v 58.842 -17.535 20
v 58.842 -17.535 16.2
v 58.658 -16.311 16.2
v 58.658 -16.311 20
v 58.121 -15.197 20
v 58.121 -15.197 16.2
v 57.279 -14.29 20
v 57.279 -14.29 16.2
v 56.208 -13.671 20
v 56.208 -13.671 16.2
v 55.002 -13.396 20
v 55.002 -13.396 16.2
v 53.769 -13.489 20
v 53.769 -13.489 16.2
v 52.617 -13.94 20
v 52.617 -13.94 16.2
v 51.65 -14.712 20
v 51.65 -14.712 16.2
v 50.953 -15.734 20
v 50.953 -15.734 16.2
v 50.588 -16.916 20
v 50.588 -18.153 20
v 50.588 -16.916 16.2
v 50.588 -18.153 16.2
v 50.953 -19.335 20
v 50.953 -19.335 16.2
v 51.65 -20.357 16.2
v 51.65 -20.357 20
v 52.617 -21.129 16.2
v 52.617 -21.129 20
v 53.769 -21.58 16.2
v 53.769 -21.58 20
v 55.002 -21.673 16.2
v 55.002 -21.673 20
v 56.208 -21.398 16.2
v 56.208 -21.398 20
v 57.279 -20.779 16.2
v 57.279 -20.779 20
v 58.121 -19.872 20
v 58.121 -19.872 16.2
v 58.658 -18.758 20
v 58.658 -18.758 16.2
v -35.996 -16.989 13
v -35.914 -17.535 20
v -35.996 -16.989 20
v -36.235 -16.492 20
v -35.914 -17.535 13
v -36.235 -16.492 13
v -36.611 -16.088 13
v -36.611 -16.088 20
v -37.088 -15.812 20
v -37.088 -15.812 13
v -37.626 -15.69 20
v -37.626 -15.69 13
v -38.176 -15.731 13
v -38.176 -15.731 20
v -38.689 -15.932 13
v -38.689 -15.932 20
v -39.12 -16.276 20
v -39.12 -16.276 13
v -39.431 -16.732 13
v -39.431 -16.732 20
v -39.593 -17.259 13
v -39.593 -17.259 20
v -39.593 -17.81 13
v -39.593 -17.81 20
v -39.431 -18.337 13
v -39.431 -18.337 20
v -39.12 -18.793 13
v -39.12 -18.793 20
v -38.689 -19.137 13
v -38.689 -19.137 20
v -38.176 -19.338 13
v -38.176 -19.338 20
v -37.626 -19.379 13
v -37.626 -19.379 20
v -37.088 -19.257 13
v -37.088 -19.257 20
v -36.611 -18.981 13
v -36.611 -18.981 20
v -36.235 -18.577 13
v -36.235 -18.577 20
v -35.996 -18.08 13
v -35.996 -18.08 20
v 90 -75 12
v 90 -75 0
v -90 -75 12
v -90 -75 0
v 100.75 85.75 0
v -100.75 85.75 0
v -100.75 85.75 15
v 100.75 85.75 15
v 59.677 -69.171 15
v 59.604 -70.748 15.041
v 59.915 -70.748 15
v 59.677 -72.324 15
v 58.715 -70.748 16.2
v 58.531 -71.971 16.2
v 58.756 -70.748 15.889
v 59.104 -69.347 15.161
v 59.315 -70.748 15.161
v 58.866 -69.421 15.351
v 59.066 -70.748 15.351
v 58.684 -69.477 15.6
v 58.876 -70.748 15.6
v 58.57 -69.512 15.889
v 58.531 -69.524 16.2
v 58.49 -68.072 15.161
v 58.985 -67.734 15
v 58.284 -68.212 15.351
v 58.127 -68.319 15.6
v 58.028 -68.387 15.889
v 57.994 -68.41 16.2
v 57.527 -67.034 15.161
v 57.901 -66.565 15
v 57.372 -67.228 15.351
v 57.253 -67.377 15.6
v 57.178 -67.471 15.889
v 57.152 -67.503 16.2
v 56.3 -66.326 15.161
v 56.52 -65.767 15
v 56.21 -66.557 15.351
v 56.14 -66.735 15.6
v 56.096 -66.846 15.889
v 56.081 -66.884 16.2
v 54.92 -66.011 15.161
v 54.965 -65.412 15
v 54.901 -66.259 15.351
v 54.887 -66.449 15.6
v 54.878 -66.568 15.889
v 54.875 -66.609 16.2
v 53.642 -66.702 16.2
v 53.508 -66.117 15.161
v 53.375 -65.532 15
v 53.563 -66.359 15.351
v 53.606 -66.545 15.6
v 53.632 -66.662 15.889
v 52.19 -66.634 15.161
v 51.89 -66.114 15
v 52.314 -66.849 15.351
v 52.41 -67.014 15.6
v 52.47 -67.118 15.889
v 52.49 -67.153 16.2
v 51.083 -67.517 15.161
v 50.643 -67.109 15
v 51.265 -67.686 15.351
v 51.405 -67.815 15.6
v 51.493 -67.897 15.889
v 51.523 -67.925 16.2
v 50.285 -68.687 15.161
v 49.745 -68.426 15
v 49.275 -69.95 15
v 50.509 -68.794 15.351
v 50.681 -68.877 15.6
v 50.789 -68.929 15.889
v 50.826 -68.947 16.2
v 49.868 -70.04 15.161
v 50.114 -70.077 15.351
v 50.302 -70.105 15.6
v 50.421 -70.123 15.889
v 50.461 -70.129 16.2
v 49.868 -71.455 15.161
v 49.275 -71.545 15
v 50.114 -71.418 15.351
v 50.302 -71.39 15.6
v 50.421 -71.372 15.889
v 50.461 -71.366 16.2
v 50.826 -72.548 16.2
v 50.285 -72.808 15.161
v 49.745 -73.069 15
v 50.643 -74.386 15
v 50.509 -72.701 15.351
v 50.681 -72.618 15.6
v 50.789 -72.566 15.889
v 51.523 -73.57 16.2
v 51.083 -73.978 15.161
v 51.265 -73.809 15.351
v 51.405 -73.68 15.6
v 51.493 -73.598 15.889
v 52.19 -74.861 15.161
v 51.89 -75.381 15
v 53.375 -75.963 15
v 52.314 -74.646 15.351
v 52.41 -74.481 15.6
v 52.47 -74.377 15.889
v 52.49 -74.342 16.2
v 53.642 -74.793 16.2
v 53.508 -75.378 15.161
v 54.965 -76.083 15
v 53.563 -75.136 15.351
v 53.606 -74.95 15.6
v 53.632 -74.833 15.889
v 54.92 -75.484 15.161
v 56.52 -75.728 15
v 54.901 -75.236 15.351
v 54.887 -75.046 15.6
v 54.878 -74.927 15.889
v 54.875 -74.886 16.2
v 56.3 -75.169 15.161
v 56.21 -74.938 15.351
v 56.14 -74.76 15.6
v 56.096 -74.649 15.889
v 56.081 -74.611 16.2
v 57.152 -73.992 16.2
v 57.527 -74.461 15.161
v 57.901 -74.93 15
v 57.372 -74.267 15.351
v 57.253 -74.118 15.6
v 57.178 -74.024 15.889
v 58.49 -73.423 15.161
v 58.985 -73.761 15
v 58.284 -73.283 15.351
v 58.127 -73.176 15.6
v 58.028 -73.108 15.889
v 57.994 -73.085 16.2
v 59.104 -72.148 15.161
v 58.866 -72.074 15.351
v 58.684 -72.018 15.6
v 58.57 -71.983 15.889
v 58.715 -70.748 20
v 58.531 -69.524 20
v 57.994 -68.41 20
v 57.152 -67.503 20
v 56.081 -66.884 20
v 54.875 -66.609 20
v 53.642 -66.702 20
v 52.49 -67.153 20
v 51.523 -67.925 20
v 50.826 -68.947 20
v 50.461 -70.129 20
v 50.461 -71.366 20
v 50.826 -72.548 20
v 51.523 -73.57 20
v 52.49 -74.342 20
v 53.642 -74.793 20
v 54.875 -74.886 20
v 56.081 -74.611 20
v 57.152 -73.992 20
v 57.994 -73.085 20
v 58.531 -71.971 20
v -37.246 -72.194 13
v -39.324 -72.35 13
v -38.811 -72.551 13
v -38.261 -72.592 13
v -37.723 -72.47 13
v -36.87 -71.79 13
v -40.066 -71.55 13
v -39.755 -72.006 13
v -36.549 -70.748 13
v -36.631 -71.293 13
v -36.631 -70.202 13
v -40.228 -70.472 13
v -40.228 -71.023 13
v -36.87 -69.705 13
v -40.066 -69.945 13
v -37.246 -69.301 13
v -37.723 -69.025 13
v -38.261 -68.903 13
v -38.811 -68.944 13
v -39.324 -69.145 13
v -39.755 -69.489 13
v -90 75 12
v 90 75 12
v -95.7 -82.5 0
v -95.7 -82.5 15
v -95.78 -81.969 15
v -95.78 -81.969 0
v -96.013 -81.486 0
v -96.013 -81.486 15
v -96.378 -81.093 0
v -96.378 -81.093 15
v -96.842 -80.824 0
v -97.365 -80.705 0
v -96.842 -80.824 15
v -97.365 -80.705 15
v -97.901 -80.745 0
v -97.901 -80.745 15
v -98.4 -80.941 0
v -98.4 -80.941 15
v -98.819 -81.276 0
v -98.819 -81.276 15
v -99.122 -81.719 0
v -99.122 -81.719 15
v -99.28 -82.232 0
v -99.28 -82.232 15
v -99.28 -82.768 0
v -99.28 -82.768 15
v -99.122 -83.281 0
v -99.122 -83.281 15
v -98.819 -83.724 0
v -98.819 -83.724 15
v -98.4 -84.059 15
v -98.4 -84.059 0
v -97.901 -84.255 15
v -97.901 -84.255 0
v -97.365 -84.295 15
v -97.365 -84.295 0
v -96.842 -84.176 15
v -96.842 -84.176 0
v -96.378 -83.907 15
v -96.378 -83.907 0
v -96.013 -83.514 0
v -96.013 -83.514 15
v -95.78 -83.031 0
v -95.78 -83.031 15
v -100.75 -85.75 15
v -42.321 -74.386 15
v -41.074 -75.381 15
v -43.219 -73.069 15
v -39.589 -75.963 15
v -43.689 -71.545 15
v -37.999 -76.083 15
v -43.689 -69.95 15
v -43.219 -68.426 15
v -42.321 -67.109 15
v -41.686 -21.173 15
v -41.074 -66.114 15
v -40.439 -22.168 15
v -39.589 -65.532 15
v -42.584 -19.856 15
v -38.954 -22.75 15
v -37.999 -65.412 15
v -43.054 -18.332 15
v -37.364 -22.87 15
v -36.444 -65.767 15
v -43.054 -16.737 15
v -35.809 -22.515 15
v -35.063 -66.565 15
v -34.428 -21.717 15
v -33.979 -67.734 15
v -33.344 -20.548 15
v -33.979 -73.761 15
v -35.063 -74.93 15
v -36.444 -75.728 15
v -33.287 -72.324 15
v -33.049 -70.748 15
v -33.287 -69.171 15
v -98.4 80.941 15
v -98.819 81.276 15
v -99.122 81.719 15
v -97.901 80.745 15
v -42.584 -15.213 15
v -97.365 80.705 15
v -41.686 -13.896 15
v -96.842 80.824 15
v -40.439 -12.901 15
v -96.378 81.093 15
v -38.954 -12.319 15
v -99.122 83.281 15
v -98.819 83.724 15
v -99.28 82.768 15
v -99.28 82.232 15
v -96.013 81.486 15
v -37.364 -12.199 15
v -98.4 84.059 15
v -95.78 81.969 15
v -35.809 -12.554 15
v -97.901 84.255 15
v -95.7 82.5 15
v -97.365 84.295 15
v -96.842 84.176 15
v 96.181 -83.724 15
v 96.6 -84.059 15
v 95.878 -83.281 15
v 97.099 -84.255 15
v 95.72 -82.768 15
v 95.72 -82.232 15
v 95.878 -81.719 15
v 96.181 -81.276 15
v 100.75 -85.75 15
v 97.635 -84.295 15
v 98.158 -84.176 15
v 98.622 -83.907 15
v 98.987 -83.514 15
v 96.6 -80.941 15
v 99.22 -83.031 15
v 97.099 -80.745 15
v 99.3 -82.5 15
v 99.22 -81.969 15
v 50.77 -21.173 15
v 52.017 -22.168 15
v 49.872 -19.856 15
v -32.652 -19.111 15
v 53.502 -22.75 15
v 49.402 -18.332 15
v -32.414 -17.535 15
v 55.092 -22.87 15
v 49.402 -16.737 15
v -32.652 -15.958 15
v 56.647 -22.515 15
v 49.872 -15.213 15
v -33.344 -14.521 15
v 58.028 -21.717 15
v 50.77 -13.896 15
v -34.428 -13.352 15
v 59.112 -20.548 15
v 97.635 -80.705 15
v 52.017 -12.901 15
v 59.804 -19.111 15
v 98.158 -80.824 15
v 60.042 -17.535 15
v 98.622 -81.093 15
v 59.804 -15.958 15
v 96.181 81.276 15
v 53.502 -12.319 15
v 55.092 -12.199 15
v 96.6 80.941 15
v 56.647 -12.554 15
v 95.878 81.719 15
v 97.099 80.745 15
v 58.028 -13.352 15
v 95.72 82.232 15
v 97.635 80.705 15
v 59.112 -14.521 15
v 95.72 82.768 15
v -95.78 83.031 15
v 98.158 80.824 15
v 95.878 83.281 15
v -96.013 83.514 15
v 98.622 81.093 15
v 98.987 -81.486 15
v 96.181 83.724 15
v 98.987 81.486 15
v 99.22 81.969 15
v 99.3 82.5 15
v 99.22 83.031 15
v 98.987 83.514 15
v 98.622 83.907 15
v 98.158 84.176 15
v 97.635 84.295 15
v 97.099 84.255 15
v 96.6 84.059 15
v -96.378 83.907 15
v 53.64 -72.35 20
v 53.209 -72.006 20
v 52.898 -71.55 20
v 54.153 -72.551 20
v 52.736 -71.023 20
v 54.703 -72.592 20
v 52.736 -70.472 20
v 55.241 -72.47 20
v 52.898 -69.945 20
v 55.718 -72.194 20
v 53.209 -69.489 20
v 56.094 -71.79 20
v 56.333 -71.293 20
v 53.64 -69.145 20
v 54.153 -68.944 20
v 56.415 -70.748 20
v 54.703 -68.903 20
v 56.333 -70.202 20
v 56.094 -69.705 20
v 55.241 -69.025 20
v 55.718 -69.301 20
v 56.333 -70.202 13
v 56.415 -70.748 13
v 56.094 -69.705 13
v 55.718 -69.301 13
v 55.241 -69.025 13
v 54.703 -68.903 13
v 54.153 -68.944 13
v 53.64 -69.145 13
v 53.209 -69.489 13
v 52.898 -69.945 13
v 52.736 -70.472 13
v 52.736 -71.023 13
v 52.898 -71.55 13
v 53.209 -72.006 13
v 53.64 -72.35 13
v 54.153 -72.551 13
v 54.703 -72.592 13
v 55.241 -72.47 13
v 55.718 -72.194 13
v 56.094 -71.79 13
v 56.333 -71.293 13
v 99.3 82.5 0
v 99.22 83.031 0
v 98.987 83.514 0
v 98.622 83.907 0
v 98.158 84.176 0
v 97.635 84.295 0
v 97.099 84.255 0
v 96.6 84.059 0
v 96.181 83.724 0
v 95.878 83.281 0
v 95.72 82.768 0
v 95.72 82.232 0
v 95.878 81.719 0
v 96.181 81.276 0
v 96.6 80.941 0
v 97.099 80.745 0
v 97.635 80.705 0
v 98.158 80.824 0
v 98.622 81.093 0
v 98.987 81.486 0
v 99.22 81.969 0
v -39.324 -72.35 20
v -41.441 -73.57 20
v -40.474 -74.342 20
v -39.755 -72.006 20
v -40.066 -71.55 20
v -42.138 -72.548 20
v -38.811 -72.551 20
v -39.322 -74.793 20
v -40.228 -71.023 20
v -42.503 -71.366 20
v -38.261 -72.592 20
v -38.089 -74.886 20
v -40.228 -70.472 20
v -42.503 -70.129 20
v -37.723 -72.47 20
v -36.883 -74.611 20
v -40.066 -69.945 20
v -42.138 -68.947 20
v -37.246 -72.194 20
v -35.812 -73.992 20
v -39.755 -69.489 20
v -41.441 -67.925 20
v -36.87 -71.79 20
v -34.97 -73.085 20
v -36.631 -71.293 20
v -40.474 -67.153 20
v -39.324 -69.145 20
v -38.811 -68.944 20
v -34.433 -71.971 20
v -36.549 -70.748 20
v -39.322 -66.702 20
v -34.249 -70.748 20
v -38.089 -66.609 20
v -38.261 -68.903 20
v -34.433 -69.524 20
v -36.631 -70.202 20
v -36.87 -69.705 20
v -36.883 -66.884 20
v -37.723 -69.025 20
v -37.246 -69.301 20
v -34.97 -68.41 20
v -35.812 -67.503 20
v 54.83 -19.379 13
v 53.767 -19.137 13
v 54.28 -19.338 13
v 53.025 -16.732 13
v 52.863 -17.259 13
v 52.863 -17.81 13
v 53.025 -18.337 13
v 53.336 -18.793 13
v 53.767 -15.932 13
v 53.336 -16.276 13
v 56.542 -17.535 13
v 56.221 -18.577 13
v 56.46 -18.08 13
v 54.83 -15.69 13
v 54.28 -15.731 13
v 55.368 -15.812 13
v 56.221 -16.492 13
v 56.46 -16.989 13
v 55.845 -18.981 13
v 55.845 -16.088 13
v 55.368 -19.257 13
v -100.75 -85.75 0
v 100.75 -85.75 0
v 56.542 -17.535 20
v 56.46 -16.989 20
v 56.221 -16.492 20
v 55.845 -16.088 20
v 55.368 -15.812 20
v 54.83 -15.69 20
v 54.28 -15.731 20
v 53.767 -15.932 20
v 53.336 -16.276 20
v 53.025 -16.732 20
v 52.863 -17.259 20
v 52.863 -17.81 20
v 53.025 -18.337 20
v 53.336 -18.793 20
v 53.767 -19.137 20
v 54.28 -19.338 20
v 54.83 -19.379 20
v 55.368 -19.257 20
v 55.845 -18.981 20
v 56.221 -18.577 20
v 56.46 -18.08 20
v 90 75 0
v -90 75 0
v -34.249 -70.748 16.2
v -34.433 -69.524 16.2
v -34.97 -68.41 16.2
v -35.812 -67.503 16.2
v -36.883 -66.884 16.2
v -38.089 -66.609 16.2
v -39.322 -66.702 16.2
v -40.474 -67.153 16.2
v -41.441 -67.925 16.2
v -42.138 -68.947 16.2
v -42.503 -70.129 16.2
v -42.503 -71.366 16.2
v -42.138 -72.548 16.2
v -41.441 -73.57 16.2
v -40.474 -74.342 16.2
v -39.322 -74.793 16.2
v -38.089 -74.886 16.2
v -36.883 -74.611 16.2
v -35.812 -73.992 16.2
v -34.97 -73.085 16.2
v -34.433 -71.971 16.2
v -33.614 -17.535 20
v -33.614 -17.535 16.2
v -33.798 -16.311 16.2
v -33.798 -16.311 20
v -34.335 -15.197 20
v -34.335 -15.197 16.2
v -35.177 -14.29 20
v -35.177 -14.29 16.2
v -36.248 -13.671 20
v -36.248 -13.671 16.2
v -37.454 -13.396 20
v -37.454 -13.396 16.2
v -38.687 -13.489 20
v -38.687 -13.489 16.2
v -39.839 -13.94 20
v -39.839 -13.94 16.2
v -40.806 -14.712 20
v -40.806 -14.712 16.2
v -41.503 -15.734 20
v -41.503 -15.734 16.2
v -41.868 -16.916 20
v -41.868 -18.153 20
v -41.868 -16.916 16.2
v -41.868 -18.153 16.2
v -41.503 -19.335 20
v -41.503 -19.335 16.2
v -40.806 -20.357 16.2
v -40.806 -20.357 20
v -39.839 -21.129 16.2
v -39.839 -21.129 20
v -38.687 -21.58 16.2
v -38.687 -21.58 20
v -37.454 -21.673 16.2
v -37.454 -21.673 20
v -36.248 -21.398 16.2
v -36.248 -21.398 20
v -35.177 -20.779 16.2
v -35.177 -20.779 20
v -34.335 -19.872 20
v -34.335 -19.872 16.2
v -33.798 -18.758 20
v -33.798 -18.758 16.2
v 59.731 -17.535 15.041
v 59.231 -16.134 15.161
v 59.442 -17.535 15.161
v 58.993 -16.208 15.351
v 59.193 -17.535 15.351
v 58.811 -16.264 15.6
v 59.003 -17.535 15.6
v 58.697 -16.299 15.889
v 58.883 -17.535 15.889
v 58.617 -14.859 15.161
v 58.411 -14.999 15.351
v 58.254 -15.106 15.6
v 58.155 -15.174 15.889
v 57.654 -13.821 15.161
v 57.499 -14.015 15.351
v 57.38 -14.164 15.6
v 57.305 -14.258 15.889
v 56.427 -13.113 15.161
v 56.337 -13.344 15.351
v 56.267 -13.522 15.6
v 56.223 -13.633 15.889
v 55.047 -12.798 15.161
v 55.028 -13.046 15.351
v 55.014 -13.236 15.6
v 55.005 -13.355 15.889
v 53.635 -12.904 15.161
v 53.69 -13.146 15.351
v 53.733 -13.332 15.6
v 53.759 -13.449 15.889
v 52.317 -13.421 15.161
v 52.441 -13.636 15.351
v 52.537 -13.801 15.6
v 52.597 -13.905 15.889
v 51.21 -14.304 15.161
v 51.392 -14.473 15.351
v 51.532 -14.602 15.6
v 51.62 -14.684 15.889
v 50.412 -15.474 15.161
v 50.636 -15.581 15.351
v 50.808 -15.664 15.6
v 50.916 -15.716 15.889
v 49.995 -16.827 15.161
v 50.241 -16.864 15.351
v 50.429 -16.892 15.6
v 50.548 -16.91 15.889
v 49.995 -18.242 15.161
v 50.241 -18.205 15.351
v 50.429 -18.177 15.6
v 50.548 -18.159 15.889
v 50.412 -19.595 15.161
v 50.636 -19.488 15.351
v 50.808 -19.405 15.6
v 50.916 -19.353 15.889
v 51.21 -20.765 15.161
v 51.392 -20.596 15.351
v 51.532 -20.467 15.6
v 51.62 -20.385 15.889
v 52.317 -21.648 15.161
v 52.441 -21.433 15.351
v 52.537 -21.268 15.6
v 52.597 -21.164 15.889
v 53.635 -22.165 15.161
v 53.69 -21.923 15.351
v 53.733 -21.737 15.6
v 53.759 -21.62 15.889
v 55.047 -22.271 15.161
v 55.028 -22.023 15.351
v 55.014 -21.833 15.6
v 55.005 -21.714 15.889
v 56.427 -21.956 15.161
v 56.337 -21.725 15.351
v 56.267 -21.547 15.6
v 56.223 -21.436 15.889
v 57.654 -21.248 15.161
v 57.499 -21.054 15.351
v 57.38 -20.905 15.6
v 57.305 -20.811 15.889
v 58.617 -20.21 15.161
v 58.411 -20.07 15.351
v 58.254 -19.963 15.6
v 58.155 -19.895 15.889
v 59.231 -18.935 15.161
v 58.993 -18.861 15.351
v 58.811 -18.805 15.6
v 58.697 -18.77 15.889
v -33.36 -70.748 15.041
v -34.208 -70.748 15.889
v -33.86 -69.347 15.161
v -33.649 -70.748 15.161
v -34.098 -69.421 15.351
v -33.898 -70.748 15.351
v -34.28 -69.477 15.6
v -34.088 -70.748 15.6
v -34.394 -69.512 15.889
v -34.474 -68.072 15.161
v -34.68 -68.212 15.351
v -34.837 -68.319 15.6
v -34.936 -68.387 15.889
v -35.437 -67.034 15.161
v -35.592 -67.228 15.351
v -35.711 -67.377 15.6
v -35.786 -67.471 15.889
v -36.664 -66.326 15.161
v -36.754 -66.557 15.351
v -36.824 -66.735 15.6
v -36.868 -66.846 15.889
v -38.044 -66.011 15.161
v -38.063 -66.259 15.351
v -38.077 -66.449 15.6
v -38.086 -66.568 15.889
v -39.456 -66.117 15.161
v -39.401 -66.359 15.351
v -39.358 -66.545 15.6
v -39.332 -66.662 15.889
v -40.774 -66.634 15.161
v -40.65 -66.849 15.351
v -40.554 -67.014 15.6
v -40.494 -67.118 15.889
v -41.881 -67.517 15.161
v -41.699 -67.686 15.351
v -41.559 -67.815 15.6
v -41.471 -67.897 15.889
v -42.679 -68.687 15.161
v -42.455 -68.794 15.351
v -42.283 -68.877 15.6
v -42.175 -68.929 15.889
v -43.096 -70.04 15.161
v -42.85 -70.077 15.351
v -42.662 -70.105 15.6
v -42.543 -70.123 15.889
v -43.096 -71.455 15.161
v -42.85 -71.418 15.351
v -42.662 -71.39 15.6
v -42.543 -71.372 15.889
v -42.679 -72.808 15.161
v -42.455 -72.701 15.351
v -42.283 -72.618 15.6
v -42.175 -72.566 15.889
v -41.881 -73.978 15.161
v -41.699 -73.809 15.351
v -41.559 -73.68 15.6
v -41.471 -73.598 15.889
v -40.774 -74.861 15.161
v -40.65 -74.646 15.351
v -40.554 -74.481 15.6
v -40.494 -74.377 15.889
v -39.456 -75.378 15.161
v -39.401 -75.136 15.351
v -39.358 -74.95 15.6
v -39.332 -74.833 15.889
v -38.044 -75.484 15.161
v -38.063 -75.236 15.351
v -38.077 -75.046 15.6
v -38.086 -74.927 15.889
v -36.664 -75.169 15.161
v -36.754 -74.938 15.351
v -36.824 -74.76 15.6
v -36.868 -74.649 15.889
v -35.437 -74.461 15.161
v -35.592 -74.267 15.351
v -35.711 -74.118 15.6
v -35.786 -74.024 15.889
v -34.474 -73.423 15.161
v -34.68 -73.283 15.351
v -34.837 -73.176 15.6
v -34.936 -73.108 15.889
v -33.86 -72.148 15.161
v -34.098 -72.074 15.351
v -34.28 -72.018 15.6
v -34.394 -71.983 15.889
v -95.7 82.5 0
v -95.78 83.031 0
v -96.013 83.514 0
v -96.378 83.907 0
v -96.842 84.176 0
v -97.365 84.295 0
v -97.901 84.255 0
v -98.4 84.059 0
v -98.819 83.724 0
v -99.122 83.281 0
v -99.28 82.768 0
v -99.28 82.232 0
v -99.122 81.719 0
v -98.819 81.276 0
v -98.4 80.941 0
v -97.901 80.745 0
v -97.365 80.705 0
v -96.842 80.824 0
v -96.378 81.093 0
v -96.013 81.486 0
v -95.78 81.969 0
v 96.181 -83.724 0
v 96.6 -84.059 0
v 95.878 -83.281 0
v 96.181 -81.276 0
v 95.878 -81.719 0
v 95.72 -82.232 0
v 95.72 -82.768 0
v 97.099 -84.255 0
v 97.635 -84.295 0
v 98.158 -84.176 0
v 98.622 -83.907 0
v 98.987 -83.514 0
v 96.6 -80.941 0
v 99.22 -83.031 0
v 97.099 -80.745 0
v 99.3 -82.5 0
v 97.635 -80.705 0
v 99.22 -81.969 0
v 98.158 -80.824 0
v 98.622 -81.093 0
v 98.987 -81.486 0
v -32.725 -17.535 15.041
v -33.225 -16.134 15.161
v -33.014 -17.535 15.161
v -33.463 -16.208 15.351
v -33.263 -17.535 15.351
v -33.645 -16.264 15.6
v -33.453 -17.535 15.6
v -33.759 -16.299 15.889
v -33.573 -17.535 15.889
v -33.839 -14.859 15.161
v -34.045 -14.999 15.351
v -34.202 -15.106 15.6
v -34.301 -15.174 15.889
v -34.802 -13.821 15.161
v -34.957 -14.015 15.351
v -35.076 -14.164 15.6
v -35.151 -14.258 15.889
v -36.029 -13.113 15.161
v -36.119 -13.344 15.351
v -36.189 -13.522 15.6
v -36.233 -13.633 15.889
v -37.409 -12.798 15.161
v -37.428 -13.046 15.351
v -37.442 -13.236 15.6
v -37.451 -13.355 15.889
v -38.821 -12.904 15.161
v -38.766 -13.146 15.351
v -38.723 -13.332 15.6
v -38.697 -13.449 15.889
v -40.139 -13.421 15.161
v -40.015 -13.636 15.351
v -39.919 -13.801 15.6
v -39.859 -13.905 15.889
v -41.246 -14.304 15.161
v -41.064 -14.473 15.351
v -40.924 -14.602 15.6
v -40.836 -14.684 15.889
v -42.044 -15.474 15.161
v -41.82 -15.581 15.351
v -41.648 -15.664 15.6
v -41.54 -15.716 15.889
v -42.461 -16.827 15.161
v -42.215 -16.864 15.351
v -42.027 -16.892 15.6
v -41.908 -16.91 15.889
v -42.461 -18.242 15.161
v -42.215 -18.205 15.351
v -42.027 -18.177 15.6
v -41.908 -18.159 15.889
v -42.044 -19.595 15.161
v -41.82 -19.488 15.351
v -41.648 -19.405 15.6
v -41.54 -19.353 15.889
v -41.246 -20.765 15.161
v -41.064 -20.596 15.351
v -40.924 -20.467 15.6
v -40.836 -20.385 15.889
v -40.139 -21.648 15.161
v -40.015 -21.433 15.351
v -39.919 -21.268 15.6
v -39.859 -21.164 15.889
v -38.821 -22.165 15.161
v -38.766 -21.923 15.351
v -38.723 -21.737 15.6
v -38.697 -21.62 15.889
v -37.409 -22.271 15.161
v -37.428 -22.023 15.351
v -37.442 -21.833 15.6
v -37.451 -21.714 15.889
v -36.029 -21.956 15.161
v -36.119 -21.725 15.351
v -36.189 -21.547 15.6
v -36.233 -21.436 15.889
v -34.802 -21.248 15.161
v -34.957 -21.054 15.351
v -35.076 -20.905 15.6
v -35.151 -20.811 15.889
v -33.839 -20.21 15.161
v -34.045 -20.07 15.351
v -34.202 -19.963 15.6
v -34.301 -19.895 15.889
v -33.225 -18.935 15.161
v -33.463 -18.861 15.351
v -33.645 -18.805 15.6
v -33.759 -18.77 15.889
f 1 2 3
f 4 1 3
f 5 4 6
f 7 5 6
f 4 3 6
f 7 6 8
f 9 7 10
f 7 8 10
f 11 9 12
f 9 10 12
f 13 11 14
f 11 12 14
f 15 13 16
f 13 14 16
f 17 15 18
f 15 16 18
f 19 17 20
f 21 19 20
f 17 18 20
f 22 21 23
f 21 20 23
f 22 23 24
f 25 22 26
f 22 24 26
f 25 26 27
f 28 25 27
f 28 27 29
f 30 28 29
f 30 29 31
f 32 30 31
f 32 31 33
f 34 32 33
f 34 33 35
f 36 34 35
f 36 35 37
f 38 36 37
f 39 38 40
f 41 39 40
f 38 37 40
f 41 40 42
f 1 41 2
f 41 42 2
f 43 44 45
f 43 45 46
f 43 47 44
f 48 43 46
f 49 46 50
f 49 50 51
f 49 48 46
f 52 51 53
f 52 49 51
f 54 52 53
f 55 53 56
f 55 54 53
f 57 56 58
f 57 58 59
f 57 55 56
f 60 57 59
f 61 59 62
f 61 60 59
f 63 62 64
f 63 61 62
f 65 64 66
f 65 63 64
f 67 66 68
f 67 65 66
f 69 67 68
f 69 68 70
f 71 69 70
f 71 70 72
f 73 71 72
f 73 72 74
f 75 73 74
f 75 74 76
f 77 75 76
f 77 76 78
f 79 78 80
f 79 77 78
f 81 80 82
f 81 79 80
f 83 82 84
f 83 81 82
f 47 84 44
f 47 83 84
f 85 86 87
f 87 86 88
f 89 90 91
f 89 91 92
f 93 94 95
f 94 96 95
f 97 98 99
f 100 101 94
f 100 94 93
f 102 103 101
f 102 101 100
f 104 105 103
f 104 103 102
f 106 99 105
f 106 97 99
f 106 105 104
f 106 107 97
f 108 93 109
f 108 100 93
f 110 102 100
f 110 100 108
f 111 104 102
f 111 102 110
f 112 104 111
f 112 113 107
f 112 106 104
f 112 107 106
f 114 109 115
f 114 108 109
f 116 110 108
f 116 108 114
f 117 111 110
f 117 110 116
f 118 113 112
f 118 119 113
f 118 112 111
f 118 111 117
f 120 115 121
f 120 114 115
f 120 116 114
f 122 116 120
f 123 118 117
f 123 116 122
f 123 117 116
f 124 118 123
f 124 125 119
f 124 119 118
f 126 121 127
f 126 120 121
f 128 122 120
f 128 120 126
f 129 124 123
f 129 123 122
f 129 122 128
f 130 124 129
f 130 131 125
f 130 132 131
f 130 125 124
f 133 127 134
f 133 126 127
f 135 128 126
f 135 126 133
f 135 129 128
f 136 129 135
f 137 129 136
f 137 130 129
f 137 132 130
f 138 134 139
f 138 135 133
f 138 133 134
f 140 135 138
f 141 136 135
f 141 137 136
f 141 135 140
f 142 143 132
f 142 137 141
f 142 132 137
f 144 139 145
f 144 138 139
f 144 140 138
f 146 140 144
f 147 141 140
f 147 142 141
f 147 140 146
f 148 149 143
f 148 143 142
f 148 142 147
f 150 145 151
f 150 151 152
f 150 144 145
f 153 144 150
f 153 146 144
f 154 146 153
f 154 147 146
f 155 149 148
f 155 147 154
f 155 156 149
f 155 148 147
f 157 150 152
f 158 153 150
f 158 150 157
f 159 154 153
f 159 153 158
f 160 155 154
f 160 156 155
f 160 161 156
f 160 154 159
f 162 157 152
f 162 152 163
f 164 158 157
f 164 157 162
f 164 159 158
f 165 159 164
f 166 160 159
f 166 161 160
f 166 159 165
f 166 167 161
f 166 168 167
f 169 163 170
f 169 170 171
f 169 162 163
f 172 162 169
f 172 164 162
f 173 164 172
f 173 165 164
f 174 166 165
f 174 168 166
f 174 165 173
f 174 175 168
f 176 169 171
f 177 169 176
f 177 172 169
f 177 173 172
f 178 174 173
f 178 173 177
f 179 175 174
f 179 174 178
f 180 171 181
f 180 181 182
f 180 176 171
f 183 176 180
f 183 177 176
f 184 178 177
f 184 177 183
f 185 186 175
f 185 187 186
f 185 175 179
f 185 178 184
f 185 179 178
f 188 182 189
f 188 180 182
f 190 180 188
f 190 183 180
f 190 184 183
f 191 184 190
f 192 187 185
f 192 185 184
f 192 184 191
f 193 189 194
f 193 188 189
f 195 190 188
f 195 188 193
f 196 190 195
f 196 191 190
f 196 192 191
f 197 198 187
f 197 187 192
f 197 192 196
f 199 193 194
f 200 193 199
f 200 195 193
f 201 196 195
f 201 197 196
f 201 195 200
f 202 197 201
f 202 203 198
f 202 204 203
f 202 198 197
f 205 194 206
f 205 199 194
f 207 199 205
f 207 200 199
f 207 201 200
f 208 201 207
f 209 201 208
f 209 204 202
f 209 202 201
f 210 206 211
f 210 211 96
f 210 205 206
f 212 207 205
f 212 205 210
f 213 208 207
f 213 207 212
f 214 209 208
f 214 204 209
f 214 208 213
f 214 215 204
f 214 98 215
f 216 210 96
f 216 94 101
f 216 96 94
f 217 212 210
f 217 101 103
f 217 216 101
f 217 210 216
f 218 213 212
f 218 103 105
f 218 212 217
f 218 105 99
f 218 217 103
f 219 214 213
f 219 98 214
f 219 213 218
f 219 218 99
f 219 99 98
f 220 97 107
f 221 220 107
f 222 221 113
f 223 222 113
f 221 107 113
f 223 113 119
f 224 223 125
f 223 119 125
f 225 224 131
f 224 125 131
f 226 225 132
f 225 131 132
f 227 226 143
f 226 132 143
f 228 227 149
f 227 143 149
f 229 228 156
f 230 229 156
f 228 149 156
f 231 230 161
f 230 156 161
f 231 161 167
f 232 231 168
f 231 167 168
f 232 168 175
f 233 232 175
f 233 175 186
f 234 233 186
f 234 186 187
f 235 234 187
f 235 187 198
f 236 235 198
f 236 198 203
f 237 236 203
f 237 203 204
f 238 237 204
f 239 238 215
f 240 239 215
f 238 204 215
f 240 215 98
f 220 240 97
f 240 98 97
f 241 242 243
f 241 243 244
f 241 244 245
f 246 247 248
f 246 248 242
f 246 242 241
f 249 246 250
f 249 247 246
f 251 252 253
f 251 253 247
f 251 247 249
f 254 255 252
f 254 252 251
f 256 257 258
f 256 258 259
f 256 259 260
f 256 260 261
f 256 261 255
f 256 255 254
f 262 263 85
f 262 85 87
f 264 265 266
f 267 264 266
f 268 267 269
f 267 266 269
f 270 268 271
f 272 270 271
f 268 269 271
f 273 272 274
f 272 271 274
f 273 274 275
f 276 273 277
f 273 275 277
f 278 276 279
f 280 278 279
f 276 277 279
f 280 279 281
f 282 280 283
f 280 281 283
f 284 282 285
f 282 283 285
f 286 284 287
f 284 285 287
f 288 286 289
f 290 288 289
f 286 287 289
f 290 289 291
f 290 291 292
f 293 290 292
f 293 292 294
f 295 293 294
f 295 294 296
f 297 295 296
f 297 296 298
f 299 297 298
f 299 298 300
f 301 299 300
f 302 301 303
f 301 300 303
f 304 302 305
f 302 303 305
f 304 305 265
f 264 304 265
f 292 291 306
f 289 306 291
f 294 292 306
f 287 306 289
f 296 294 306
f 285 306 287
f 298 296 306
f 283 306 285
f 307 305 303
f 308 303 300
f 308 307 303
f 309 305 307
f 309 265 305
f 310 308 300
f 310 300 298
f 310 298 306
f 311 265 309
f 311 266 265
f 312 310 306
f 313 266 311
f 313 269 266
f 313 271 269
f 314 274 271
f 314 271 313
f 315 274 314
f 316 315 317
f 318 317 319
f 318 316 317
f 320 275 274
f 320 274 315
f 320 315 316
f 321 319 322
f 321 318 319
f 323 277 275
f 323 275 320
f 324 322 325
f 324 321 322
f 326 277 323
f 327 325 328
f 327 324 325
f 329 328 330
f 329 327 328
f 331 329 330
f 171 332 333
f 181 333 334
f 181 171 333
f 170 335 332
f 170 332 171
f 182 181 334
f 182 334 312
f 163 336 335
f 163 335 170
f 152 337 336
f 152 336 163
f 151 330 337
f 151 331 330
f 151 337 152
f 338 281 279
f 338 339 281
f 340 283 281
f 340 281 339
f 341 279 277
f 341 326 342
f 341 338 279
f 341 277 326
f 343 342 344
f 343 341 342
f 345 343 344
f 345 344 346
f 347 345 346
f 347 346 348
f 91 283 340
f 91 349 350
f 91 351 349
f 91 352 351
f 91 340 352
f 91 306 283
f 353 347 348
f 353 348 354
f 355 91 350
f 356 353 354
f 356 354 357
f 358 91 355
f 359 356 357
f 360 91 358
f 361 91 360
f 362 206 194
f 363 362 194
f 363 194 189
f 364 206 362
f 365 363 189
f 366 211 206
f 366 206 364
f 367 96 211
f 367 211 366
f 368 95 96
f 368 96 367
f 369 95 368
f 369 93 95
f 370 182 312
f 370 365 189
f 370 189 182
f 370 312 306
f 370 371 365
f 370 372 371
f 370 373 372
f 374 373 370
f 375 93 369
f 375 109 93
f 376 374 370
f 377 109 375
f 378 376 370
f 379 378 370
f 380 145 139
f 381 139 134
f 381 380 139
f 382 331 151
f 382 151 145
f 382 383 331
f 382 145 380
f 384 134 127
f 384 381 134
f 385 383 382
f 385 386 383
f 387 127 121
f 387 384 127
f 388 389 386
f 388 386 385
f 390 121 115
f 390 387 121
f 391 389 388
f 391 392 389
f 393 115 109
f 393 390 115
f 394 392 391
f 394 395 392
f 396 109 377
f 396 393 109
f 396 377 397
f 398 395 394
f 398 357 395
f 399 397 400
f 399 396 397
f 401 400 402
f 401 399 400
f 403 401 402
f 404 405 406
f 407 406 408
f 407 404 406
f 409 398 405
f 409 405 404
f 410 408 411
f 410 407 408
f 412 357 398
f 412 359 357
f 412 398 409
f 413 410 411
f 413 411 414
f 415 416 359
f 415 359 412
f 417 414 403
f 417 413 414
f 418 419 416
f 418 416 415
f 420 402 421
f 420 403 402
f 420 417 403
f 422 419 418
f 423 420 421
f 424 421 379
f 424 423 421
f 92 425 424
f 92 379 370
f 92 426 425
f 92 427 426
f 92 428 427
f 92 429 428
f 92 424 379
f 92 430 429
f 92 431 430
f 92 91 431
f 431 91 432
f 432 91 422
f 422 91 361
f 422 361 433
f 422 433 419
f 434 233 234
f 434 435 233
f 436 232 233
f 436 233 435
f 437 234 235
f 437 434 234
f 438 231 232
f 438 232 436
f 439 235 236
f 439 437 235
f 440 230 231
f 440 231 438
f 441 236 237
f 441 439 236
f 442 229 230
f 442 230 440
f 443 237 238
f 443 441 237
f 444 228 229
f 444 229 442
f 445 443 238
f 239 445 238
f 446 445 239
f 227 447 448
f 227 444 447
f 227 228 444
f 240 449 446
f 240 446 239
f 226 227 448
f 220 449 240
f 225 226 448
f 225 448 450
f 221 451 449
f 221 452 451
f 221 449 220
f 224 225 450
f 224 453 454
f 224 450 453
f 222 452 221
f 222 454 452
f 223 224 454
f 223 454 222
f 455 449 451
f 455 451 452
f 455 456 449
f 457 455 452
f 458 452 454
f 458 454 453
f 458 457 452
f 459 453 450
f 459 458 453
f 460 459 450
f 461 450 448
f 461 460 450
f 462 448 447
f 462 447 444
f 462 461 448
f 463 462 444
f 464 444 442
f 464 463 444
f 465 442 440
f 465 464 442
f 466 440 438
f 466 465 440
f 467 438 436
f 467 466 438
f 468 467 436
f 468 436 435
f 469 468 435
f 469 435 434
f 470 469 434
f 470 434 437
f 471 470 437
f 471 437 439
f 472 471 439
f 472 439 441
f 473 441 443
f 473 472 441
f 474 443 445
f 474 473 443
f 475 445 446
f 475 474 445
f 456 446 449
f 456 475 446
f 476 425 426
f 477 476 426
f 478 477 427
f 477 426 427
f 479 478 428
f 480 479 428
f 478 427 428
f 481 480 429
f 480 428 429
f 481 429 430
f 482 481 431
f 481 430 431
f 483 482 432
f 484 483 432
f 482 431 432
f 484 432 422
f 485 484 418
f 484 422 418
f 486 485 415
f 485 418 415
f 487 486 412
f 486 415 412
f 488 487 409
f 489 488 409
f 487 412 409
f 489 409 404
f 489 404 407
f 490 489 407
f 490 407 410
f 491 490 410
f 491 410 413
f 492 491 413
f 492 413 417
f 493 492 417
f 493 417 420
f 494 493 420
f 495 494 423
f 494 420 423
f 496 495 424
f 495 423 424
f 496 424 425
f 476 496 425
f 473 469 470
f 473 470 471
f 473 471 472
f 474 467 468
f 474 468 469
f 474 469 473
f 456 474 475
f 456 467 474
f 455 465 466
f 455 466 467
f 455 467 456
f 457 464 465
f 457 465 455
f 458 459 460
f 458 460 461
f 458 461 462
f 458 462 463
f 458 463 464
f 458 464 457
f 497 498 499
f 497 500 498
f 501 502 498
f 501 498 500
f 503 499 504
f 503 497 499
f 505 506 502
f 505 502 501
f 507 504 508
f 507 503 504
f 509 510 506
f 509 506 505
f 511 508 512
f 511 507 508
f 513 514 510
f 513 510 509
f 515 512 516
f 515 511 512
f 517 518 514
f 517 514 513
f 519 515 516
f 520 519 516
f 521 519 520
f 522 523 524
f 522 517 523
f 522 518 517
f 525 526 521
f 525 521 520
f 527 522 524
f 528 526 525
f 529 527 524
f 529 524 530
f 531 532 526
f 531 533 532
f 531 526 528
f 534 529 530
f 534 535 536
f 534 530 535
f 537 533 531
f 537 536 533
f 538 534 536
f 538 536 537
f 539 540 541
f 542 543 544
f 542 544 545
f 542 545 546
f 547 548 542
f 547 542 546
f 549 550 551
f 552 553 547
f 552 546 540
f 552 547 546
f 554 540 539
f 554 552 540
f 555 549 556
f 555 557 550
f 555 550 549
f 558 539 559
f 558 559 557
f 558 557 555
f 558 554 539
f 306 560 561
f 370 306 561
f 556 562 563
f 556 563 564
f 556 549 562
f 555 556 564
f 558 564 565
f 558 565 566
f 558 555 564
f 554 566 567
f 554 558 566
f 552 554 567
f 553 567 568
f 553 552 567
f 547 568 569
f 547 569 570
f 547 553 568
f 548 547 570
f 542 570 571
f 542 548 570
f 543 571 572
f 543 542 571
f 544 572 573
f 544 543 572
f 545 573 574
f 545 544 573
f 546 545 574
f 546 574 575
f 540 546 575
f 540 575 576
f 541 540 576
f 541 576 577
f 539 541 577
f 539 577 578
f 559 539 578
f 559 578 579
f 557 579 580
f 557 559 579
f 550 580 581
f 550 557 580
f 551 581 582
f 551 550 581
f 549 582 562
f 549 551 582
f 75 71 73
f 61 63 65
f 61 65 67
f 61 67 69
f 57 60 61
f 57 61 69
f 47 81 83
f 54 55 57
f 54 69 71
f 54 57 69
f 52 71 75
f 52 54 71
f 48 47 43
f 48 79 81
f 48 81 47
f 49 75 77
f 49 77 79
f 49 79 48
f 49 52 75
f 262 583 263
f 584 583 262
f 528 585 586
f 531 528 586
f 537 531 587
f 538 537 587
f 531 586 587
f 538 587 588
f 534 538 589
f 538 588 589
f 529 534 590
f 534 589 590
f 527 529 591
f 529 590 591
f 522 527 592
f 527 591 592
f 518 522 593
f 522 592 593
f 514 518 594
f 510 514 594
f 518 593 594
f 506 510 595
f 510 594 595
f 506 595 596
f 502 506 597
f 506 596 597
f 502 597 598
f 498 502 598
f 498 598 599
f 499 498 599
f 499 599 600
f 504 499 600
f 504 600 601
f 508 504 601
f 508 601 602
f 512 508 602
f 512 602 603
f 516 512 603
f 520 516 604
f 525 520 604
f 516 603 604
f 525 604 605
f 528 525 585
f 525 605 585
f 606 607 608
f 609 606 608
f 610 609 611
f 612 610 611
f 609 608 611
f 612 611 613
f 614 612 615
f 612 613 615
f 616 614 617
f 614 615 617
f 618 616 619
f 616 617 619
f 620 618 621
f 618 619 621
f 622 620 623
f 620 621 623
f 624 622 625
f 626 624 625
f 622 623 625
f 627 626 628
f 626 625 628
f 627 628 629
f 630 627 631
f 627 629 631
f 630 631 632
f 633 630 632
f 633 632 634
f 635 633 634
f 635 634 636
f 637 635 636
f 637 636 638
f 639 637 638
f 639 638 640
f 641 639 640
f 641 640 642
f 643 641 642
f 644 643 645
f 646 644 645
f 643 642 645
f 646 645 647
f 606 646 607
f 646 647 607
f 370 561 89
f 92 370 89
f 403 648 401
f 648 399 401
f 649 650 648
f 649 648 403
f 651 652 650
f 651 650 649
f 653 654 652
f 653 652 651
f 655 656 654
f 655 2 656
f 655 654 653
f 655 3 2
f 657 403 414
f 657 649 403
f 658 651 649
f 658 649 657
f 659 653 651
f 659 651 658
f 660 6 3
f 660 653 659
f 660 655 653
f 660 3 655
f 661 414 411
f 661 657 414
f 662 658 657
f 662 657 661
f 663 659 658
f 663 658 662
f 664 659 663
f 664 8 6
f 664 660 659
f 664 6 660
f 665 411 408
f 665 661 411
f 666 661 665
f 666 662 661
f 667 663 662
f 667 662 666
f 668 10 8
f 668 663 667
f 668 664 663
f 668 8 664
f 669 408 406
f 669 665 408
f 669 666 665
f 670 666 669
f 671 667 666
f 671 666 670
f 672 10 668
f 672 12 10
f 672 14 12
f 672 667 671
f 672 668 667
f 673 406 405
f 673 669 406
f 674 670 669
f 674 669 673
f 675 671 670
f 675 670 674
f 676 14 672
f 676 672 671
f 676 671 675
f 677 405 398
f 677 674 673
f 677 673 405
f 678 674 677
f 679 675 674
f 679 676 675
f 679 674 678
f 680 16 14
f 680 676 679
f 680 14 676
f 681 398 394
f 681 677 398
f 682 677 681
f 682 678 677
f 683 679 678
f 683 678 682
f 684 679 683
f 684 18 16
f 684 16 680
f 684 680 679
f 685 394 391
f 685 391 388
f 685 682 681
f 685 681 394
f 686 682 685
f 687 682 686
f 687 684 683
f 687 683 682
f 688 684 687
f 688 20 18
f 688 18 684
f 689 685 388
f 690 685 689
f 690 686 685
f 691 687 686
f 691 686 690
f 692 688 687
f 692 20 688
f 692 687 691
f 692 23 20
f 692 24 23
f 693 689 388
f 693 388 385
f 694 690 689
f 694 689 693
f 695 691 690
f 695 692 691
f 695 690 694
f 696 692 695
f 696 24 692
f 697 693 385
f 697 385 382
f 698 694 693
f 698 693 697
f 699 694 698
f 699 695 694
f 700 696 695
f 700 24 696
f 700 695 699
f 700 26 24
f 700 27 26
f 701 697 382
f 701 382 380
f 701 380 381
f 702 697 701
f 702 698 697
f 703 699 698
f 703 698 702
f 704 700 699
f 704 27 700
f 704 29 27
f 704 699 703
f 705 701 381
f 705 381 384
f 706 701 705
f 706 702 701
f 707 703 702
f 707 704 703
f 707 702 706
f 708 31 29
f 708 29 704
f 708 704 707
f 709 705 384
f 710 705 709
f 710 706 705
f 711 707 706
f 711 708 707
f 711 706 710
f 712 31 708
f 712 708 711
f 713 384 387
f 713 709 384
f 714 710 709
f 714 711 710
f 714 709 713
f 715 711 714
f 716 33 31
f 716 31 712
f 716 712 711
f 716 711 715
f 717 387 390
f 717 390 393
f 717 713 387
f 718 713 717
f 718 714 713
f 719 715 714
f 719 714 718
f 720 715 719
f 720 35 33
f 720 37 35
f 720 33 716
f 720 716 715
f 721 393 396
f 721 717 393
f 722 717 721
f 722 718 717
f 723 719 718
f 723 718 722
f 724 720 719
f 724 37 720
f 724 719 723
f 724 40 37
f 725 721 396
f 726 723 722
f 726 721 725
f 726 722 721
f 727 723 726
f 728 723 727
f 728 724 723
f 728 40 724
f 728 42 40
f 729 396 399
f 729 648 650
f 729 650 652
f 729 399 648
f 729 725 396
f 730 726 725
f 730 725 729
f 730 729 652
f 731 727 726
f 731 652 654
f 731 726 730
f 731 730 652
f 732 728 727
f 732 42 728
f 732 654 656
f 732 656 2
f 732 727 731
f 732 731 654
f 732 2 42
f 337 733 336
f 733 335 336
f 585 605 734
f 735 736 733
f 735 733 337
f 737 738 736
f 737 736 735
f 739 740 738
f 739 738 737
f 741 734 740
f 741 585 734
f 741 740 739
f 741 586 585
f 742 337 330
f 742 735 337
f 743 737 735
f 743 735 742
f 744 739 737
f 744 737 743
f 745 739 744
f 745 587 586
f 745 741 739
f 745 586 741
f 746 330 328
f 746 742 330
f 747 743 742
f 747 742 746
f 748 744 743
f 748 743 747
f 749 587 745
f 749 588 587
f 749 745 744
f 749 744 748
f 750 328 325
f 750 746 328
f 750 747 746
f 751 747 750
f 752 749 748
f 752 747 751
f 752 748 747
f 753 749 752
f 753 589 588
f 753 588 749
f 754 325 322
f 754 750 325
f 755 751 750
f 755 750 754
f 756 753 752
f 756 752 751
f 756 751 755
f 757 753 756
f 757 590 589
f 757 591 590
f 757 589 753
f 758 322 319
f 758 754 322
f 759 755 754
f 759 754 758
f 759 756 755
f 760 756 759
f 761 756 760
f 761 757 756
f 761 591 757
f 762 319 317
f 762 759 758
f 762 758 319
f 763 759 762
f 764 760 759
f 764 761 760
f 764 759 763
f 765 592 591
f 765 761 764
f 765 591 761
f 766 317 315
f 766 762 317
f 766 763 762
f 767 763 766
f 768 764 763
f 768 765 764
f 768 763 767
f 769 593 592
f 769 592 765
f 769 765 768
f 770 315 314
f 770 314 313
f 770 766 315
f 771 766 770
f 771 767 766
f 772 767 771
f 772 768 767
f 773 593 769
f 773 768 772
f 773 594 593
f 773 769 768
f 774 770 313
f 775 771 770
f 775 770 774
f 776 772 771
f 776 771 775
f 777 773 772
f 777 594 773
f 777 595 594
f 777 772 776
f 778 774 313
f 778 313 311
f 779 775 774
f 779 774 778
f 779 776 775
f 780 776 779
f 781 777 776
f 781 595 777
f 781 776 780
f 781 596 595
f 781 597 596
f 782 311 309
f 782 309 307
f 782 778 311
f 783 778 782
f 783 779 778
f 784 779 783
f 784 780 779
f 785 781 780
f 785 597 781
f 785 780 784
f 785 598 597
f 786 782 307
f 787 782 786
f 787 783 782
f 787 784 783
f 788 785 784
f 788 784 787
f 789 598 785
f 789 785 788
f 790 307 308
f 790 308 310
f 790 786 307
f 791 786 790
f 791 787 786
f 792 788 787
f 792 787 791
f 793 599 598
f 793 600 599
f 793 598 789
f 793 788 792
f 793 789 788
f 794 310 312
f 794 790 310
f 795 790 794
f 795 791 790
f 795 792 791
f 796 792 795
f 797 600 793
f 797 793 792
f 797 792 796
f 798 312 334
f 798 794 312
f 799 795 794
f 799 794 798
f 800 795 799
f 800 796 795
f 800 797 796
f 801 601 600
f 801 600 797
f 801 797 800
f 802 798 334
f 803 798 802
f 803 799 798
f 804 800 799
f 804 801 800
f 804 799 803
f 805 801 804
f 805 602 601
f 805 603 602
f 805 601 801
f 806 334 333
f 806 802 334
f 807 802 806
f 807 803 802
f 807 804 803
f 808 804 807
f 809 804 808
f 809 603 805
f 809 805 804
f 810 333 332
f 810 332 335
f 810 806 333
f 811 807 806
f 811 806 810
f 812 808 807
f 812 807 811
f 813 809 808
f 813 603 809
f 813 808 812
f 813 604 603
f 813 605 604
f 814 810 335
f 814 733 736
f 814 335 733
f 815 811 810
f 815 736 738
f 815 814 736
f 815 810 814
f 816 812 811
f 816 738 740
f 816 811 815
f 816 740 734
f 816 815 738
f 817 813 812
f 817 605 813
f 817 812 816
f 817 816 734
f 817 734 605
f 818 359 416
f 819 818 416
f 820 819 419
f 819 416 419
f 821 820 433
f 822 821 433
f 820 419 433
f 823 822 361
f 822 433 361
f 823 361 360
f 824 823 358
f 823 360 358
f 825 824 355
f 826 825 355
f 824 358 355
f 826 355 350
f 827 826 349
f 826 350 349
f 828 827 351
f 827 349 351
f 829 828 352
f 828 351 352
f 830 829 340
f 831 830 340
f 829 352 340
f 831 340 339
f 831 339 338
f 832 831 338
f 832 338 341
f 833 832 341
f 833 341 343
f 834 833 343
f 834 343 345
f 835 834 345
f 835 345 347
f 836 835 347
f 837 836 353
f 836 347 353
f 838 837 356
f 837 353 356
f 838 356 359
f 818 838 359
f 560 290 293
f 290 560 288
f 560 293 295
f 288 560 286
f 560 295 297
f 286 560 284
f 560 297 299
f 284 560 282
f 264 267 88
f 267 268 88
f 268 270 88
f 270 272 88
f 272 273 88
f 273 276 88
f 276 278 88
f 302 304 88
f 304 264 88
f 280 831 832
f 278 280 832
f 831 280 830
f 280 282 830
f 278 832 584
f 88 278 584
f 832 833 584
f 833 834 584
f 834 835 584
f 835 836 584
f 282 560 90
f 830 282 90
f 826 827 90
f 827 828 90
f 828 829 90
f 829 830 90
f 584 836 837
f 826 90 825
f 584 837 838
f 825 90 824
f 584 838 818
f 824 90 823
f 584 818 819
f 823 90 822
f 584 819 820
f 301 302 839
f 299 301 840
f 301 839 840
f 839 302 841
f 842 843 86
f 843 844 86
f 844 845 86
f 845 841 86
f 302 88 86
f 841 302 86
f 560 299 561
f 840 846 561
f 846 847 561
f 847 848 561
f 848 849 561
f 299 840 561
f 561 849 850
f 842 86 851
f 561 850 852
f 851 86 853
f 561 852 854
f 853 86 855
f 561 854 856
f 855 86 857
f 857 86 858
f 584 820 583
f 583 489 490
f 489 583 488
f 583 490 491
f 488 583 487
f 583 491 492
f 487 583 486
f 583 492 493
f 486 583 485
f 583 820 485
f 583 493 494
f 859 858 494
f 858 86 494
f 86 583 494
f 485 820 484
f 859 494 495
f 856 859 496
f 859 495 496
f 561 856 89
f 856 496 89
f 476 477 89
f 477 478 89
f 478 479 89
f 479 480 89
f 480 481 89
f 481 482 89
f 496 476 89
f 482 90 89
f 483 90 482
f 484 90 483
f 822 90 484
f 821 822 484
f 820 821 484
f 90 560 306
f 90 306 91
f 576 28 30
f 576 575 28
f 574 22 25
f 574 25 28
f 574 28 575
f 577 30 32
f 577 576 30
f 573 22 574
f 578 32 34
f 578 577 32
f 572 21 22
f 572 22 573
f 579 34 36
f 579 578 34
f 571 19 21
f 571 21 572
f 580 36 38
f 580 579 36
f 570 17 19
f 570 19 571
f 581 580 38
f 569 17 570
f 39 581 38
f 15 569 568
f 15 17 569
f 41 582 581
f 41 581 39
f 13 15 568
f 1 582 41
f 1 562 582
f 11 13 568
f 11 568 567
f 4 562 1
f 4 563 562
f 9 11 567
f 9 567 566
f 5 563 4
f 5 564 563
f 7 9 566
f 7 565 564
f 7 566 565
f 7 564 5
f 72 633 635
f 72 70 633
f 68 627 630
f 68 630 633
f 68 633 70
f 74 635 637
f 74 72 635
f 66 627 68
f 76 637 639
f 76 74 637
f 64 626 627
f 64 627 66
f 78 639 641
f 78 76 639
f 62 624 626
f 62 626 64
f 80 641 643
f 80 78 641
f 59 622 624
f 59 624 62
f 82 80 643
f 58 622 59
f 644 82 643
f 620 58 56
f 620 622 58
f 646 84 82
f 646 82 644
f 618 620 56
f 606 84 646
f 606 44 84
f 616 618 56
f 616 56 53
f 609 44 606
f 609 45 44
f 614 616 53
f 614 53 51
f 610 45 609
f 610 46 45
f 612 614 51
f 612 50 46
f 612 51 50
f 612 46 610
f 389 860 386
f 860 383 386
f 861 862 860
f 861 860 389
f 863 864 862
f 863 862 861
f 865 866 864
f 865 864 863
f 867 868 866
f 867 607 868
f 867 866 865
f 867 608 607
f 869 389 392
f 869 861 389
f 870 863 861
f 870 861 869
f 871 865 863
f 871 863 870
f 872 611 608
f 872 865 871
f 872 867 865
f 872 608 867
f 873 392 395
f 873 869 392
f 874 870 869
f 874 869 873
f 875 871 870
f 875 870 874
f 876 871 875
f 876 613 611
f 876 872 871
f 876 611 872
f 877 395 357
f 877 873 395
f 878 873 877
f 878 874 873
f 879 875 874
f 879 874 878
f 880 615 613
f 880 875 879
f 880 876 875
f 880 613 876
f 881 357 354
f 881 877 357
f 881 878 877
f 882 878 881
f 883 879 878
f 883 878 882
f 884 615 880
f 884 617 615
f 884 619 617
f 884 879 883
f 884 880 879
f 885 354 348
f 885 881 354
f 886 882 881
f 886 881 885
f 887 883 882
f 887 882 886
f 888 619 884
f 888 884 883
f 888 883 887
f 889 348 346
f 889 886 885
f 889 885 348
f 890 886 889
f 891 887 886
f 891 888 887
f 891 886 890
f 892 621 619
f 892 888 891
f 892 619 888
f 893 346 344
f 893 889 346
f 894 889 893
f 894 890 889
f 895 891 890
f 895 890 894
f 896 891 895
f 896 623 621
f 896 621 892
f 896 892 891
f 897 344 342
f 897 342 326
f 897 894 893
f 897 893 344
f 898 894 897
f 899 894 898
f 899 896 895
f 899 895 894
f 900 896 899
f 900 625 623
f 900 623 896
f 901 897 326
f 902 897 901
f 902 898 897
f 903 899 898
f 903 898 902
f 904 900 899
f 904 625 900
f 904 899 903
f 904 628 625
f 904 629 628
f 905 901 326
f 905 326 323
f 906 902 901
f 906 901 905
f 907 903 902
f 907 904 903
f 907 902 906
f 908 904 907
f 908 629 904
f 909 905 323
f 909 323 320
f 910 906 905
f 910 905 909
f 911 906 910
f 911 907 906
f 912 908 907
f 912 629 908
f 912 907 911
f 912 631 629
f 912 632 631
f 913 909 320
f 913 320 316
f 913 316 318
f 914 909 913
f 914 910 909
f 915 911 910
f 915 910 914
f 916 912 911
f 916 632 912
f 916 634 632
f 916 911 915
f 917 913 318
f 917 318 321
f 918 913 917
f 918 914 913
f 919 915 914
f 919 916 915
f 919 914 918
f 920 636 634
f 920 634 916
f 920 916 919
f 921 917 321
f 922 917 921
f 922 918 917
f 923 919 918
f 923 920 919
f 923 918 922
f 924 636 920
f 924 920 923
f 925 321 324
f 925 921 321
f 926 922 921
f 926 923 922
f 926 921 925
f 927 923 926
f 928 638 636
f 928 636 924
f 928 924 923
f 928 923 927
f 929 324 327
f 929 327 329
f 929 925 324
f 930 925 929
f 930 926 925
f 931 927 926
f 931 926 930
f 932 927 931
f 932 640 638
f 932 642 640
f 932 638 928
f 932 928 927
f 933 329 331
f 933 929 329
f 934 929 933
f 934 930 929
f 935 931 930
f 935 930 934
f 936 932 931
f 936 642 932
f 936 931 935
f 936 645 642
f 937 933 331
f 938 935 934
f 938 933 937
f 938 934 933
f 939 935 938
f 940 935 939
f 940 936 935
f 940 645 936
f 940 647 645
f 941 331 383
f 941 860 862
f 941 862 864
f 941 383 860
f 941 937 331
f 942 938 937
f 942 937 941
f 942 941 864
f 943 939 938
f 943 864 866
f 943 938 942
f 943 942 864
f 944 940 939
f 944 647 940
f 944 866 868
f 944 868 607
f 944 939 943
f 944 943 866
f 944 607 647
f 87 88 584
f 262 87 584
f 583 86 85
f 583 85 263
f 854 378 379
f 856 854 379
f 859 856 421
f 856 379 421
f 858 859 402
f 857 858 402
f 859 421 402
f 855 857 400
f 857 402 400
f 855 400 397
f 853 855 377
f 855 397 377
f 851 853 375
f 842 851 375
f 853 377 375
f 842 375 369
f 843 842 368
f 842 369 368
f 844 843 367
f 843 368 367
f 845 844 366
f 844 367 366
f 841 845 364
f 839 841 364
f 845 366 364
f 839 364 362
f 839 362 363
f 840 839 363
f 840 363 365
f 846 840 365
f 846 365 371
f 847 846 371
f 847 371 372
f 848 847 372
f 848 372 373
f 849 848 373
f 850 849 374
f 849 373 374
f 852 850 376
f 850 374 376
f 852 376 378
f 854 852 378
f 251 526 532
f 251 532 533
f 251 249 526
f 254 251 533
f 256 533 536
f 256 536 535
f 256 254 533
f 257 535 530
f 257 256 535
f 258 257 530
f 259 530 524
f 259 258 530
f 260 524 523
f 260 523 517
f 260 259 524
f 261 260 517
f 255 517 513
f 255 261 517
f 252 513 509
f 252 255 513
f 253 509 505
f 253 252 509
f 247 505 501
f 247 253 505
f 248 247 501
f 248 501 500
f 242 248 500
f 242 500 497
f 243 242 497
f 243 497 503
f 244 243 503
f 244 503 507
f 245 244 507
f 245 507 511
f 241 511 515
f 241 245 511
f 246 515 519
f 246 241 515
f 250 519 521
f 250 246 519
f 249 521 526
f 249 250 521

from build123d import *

# Parameters (mm, degrees)
SKETCH1_W             = 201.5
SKETCH1_H             = 171.5
MAIN_BODY_DEPTH       = 15
SKETCH2_R             = 1.8
SCREW_HOLES_DEPTH     = 15
SKETCH3_R             = 4.15
SKETCH3_R_2           = 1.85
PCB_SCREW_AREA_DEPTH  = 5
SKETCH4_W             = 180
SKETCH4_H             = 150
MAIN_CUT_DEPTH        = 12
FILLET3_R             = 1.2
PCB_START             = -2
SKETCH6_R             = 1.85
PCB_SCREW_HOLES_DEPTH = 2


with BuildPart() as part:
    # Sketch1 → Main Body (new body)
    with BuildSketch(Plane.XY):
        Rectangle(SKETCH1_W, SKETCH1_H)
    extrude(amount=MAIN_BODY_DEPTH)

    # Sketch2 → Screw Holes (cut)
    with BuildSketch(Plane.XY.offset(15)):
        with Locations((-97.5, 82.5)):
            Circle(SKETCH2_R)
        with Locations((97.5, 82.5)):
            Circle(SKETCH2_R)
        with Locations((97.5, -82.5)):
            Circle(SKETCH2_R)
        with Locations((-97.5, -82.5)):
            Circle(SKETCH2_R)
    extrude(amount=-SCREW_HOLES_DEPTH, mode=Mode.SUBTRACT)

    # Sketch3 → PCB Screw Area (add)
    # profile 1 of 4: a face of its own
    with BuildSketch(Plane.XY.offset(15)):
        with Locations((-37.7639992, -17.5345021)):
            Circle(SKETCH3_R)
        with Locations((-37.7639992, -17.5345021)):
            Circle(SKETCH3_R_2, mode=Mode.SUBTRACT)
    # profile 2 of 4: a face of its own
    with BuildSketch(Plane.XY.offset(15)):
        with Locations((54.6920008, -17.5345021)):
            Circle(SKETCH3_R)
        with Locations((54.6920008, -17.5345021)):
            Circle(SKETCH3_R_2, mode=Mode.SUBTRACT)
    # profile 3 of 4: a face of its own
    with BuildSketch(Plane.XY.offset(15)):
        with Locations((54.5650008, -70.7475021)):
            Circle(SKETCH3_R)
        with Locations((54.5650008, -70.7475021)):
            Circle(SKETCH3_R_2, mode=Mode.SUBTRACT)
    # profile 4 of 4: a face of its own
    with BuildSketch(Plane.XY.offset(15)):
        with Locations((-38.3989992, -70.7475021)):
            Circle(SKETCH3_R)
        with Locations((-38.3989992, -70.7475021)):
            Circle(SKETCH3_R_2, mode=Mode.SUBTRACT)
    extrude(amount=PCB_SCREW_AREA_DEPTH)

    # Sketch4 → Main Cut (cut)
    with BuildSketch(Plane(origin=(0, 0, 0), x_dir=(-1, 0, 0), z_dir=(0, 0, -1))):
        Rectangle(SKETCH4_W, SKETCH4_H)
    extrude(amount=-MAIN_CUT_DEPTH, mode=Mode.SUBTRACT)

    # Fillet3
    fillet3_edges = [part.edges().sort_by_distance(p)[0] for p in [
        (-42.5489992, -70.7475021, 15),
        (50.4150008, -70.7475021, 15),
        (50.5420008, -17.5345021, 15),
        (-41.9139992, -17.5345021, 15),
    ]]
    fillet(fillet3_edges, radius=FILLET3_R)

    # Sketch6 → PCB Screw Holes (cut)
    with BuildSketch(Plane.XY.offset(15).offset(PCB_START)):
        with Locations((-37.7639992, -17.5345021)):
            Circle(SKETCH6_R)
        with Locations((-38.3989992, -70.7475021)):
            Circle(SKETCH6_R)
        with Locations((54.5650008, -70.7475021)):
            Circle(SKETCH6_R)
        with Locations((54.6920008, -17.5345021)):
            Circle(SKETCH6_R)
    extrude(amount=PCB_SCREW_HOLES_DEPTH, mode=Mode.SUBTRACT)


solid = part.part
